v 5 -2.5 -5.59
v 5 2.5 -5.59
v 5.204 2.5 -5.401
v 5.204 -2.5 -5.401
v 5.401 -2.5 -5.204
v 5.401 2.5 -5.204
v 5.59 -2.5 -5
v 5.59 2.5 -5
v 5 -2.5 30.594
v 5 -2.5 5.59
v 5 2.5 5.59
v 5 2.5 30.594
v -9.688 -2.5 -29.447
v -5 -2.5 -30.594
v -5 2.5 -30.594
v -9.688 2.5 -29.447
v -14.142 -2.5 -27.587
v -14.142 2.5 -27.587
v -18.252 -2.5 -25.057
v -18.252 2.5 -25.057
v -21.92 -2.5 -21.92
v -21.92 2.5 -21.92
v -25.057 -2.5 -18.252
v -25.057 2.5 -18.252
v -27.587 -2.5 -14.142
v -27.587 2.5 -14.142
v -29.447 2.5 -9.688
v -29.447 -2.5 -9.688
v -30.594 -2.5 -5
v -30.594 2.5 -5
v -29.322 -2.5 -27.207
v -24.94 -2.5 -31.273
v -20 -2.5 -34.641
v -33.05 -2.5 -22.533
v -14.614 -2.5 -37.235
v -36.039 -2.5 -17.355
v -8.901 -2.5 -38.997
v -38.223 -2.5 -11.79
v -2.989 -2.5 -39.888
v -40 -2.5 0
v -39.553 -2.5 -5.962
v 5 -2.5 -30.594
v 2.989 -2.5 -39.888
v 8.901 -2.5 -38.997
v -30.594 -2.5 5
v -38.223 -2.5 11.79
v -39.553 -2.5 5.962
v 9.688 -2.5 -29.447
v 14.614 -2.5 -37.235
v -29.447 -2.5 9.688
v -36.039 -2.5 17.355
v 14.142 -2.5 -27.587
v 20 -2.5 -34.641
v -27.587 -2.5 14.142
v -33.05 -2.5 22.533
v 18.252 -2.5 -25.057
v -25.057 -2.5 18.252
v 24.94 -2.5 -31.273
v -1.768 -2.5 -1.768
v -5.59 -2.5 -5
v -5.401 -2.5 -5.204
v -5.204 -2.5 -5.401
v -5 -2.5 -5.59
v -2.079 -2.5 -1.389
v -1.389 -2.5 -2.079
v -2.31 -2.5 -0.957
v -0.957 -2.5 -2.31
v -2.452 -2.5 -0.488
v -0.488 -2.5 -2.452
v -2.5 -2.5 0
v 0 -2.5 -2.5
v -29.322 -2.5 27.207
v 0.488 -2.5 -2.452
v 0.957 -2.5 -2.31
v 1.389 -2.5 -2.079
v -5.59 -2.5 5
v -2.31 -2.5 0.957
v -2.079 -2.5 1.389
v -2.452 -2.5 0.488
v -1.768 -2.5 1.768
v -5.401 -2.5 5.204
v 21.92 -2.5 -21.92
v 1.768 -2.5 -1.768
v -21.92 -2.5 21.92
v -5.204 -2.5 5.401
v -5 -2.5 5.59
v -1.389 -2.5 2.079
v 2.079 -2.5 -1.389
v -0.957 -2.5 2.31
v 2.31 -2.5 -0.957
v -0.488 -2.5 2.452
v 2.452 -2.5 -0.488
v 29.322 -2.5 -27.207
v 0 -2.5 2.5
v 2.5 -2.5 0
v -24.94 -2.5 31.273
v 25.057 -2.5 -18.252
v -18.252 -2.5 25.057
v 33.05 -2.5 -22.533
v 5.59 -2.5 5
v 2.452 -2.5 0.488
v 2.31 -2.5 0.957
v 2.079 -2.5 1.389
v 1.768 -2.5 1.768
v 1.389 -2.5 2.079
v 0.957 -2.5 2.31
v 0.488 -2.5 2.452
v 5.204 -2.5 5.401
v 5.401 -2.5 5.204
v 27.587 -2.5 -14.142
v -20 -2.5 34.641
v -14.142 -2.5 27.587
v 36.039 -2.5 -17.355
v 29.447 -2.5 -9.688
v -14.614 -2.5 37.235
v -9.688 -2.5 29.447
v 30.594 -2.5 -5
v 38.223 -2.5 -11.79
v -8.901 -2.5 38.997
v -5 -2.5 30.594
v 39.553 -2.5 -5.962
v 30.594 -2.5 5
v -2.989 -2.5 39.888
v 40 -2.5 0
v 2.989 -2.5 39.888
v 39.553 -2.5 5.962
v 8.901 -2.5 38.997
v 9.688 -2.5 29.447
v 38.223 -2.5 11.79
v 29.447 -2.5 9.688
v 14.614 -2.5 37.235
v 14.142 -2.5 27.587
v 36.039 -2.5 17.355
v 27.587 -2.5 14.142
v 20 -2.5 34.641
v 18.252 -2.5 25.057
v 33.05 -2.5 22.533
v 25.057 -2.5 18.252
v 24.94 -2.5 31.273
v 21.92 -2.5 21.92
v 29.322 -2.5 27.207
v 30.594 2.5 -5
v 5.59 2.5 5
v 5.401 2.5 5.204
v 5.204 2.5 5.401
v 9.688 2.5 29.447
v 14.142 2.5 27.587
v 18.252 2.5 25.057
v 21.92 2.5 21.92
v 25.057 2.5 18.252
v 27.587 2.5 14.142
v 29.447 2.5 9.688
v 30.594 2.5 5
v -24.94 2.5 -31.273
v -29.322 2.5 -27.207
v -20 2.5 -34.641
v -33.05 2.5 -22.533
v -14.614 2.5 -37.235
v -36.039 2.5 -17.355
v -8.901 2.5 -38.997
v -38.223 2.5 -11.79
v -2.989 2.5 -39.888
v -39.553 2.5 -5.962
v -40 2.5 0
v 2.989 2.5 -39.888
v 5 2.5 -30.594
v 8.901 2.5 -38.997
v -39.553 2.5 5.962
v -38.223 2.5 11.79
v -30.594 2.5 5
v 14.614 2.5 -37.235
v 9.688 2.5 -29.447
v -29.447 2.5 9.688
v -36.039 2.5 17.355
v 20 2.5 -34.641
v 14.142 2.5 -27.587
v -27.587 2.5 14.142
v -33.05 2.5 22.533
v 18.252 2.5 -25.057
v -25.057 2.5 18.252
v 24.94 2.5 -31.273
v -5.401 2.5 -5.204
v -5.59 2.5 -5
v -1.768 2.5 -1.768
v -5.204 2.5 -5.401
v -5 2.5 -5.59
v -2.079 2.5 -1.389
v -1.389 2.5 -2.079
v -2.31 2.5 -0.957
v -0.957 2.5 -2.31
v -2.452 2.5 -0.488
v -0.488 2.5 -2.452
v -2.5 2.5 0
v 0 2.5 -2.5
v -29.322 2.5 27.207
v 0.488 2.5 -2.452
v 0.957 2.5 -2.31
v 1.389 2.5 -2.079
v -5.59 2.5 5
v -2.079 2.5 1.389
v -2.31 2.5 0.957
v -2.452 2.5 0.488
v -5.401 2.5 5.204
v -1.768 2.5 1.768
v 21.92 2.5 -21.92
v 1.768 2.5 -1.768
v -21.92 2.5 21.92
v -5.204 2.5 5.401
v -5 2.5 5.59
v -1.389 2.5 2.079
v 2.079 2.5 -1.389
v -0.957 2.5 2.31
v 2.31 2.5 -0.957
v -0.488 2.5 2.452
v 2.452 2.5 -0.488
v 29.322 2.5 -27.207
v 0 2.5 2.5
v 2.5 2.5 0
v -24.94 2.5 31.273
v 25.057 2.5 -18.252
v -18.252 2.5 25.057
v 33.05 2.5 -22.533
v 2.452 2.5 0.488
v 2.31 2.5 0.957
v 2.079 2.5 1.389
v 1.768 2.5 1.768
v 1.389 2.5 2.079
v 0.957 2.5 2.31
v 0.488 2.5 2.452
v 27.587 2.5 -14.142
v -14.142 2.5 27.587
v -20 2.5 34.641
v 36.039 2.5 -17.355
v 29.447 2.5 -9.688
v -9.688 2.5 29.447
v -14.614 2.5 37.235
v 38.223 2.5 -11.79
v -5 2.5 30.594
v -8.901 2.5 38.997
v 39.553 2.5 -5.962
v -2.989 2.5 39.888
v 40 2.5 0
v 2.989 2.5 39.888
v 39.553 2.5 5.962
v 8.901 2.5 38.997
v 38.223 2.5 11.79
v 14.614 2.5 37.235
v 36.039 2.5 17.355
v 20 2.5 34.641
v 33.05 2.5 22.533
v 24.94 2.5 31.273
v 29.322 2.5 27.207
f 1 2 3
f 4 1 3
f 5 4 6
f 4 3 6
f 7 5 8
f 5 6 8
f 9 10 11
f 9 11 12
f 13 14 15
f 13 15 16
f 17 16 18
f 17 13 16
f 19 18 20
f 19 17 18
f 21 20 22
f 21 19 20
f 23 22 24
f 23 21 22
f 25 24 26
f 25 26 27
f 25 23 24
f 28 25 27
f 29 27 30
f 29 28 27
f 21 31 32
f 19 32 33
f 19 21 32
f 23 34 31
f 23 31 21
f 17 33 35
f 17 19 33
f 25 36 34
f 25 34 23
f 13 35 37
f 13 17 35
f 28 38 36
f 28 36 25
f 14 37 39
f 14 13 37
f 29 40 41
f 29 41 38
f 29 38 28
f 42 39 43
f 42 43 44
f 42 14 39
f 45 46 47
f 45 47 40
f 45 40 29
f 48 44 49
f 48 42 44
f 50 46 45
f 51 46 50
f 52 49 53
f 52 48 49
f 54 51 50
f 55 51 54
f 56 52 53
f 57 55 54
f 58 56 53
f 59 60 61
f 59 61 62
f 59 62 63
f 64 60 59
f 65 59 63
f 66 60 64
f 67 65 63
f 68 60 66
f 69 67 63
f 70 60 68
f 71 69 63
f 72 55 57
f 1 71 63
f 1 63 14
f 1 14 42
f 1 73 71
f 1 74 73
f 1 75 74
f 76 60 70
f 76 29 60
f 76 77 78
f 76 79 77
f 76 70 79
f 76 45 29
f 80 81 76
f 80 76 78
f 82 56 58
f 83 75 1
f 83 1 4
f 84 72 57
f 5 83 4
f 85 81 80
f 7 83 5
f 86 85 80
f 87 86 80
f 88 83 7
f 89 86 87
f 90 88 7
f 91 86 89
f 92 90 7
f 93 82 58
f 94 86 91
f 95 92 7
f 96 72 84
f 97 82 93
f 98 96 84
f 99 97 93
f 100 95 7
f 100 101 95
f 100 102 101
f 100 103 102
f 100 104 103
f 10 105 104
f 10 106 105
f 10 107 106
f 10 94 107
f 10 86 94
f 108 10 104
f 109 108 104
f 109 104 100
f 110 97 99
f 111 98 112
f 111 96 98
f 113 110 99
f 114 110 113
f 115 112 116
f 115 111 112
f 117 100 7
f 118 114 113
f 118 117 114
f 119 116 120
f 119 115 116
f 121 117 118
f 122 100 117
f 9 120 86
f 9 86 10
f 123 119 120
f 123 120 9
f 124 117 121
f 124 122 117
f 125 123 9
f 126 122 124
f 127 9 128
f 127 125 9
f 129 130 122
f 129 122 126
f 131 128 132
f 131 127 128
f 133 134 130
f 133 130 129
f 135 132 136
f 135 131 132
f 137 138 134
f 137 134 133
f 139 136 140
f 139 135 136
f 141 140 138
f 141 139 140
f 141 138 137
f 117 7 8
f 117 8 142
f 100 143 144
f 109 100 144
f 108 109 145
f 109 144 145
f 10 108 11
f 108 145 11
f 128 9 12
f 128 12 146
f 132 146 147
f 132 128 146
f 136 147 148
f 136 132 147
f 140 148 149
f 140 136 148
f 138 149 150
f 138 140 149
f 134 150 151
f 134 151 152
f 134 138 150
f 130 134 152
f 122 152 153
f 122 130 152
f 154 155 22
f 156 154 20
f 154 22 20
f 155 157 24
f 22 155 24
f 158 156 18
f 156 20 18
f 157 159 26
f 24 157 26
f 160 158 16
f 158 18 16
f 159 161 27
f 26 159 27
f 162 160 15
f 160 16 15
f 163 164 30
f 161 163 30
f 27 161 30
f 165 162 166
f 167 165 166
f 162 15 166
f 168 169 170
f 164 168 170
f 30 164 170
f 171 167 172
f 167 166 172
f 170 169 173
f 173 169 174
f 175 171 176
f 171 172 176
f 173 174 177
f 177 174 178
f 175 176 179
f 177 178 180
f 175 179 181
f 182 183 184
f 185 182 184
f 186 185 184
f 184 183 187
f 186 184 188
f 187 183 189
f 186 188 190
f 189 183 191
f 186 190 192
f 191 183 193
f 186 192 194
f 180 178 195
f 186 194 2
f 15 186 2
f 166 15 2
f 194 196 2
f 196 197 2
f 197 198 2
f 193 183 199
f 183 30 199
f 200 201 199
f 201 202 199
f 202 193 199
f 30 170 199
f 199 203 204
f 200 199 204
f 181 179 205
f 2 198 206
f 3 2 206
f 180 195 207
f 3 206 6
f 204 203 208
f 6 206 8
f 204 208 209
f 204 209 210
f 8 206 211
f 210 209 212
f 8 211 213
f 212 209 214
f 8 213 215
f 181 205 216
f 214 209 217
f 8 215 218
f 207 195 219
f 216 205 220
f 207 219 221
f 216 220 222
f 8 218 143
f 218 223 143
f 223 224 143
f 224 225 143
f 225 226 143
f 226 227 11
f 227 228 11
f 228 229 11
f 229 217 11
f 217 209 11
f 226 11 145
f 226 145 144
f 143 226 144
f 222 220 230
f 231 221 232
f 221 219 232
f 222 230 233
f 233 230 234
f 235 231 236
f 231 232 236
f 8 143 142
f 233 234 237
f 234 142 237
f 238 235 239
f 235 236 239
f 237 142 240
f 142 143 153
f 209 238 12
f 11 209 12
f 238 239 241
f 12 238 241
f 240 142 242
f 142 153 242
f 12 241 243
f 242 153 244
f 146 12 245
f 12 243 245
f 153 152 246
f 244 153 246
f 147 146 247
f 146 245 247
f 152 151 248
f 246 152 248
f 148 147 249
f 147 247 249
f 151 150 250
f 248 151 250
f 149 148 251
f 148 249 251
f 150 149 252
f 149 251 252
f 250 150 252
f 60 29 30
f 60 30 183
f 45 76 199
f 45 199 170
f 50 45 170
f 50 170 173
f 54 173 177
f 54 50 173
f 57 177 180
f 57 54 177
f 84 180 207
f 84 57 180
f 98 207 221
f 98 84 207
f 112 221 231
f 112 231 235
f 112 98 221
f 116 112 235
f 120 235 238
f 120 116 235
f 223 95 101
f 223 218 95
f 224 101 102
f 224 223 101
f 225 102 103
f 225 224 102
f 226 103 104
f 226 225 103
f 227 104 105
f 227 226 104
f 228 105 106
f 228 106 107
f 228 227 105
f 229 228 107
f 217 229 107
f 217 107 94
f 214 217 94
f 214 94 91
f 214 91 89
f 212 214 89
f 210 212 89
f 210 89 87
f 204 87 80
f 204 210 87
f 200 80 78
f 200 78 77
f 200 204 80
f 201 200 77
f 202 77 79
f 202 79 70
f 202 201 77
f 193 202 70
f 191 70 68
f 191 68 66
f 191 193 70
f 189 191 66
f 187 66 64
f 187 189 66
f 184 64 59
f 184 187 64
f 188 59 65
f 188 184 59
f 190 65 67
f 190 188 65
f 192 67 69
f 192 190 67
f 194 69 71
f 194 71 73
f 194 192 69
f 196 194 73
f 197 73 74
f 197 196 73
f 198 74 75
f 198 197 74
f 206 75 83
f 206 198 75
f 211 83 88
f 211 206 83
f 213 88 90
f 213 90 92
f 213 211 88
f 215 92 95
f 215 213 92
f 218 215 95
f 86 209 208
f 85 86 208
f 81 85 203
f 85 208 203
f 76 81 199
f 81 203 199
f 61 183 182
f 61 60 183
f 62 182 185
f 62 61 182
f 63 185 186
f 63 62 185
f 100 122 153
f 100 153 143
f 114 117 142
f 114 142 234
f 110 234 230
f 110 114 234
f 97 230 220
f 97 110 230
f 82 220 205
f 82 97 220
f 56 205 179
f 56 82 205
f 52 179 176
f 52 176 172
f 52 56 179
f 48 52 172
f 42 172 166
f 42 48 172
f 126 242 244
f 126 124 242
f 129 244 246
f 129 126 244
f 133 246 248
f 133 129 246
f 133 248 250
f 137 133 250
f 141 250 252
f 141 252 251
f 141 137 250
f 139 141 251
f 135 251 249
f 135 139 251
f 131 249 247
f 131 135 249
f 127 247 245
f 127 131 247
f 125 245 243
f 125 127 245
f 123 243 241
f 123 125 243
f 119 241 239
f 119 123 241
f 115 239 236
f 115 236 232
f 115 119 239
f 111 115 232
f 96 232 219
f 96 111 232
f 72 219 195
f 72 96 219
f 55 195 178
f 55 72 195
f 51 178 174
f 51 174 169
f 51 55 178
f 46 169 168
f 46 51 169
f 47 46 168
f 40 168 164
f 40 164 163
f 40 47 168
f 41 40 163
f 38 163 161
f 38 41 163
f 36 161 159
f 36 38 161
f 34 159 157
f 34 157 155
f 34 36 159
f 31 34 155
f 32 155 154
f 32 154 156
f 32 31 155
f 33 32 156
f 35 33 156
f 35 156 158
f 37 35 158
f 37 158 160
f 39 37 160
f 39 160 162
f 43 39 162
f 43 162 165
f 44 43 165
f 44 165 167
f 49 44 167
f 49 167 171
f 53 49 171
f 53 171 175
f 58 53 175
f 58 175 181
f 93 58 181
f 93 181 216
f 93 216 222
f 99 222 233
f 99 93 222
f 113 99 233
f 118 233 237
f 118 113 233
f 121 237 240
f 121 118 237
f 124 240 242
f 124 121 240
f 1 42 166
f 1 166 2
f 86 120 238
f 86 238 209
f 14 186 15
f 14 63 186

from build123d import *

# Parameters (mm, degrees)
F0_R     = 40
F0_R_2   = 2.5
F1_DEPTH = 2.5


with BuildPart() as f1:
    # F0 (on Front) → F1 (new body, symmetric)
    with BuildSketch(Plane.XZ):
        Circle(F0_R)
        with BuildLine():
            ThreePointArc((-5, -30.594117), (-21.92031, -21.92031), (-30.594117, -5))
            Line((-30.594117, -5), (-5.59017, -5))
            ThreePointArc((-5.59017, -5), (-5.303301, -5.303301), (-5, -5.59017))
            Line((-5, -5.59017), (-5, -30.594117))
        make_face(mode=Mode.SUBTRACT)
        with BuildLine():
            Line((5, -30.594117), (5, -5.59017))
            ThreePointArc((5, -5.59017), (5.303301, -5.303301), (5.59017, -5))
            Line((5.59017, -5), (30.594117, -5))
            ThreePointArc((30.594117, -5), (21.92031, -21.92031), (5, -30.594117))
        make_face(mode=Mode.SUBTRACT)
        with BuildLine():
            Line((-5, 30.594117), (-5, 5.59017))
            ThreePointArc((-5, 5.59017), (-5.303301, 5.303301), (-5.59017, 5))
            Line((-5.59017, 5), (-30.594117, 5))
            ThreePointArc((-30.594117, 5), (-21.92031, 21.92031), (-5, 30.594117))
        make_face(mode=Mode.SUBTRACT)
        Circle(F0_R_2, mode=Mode.SUBTRACT)
        with BuildLine():
            ThreePointArc((5.59017, 5), (5.303301, 5.303301), (5, 5.59017))
            Line((5, 5.59017), (5, 30.594117))
            ThreePointArc((5, 30.594117), (21.92031, 21.92031), (30.594117, 5))
            Line((30.594117, 5), (5.59017, 5))
        make_face(mode=Mode.SUBTRACT)
    extrude(amount=F1_DEPTH, both=True)


solid = f1.part
